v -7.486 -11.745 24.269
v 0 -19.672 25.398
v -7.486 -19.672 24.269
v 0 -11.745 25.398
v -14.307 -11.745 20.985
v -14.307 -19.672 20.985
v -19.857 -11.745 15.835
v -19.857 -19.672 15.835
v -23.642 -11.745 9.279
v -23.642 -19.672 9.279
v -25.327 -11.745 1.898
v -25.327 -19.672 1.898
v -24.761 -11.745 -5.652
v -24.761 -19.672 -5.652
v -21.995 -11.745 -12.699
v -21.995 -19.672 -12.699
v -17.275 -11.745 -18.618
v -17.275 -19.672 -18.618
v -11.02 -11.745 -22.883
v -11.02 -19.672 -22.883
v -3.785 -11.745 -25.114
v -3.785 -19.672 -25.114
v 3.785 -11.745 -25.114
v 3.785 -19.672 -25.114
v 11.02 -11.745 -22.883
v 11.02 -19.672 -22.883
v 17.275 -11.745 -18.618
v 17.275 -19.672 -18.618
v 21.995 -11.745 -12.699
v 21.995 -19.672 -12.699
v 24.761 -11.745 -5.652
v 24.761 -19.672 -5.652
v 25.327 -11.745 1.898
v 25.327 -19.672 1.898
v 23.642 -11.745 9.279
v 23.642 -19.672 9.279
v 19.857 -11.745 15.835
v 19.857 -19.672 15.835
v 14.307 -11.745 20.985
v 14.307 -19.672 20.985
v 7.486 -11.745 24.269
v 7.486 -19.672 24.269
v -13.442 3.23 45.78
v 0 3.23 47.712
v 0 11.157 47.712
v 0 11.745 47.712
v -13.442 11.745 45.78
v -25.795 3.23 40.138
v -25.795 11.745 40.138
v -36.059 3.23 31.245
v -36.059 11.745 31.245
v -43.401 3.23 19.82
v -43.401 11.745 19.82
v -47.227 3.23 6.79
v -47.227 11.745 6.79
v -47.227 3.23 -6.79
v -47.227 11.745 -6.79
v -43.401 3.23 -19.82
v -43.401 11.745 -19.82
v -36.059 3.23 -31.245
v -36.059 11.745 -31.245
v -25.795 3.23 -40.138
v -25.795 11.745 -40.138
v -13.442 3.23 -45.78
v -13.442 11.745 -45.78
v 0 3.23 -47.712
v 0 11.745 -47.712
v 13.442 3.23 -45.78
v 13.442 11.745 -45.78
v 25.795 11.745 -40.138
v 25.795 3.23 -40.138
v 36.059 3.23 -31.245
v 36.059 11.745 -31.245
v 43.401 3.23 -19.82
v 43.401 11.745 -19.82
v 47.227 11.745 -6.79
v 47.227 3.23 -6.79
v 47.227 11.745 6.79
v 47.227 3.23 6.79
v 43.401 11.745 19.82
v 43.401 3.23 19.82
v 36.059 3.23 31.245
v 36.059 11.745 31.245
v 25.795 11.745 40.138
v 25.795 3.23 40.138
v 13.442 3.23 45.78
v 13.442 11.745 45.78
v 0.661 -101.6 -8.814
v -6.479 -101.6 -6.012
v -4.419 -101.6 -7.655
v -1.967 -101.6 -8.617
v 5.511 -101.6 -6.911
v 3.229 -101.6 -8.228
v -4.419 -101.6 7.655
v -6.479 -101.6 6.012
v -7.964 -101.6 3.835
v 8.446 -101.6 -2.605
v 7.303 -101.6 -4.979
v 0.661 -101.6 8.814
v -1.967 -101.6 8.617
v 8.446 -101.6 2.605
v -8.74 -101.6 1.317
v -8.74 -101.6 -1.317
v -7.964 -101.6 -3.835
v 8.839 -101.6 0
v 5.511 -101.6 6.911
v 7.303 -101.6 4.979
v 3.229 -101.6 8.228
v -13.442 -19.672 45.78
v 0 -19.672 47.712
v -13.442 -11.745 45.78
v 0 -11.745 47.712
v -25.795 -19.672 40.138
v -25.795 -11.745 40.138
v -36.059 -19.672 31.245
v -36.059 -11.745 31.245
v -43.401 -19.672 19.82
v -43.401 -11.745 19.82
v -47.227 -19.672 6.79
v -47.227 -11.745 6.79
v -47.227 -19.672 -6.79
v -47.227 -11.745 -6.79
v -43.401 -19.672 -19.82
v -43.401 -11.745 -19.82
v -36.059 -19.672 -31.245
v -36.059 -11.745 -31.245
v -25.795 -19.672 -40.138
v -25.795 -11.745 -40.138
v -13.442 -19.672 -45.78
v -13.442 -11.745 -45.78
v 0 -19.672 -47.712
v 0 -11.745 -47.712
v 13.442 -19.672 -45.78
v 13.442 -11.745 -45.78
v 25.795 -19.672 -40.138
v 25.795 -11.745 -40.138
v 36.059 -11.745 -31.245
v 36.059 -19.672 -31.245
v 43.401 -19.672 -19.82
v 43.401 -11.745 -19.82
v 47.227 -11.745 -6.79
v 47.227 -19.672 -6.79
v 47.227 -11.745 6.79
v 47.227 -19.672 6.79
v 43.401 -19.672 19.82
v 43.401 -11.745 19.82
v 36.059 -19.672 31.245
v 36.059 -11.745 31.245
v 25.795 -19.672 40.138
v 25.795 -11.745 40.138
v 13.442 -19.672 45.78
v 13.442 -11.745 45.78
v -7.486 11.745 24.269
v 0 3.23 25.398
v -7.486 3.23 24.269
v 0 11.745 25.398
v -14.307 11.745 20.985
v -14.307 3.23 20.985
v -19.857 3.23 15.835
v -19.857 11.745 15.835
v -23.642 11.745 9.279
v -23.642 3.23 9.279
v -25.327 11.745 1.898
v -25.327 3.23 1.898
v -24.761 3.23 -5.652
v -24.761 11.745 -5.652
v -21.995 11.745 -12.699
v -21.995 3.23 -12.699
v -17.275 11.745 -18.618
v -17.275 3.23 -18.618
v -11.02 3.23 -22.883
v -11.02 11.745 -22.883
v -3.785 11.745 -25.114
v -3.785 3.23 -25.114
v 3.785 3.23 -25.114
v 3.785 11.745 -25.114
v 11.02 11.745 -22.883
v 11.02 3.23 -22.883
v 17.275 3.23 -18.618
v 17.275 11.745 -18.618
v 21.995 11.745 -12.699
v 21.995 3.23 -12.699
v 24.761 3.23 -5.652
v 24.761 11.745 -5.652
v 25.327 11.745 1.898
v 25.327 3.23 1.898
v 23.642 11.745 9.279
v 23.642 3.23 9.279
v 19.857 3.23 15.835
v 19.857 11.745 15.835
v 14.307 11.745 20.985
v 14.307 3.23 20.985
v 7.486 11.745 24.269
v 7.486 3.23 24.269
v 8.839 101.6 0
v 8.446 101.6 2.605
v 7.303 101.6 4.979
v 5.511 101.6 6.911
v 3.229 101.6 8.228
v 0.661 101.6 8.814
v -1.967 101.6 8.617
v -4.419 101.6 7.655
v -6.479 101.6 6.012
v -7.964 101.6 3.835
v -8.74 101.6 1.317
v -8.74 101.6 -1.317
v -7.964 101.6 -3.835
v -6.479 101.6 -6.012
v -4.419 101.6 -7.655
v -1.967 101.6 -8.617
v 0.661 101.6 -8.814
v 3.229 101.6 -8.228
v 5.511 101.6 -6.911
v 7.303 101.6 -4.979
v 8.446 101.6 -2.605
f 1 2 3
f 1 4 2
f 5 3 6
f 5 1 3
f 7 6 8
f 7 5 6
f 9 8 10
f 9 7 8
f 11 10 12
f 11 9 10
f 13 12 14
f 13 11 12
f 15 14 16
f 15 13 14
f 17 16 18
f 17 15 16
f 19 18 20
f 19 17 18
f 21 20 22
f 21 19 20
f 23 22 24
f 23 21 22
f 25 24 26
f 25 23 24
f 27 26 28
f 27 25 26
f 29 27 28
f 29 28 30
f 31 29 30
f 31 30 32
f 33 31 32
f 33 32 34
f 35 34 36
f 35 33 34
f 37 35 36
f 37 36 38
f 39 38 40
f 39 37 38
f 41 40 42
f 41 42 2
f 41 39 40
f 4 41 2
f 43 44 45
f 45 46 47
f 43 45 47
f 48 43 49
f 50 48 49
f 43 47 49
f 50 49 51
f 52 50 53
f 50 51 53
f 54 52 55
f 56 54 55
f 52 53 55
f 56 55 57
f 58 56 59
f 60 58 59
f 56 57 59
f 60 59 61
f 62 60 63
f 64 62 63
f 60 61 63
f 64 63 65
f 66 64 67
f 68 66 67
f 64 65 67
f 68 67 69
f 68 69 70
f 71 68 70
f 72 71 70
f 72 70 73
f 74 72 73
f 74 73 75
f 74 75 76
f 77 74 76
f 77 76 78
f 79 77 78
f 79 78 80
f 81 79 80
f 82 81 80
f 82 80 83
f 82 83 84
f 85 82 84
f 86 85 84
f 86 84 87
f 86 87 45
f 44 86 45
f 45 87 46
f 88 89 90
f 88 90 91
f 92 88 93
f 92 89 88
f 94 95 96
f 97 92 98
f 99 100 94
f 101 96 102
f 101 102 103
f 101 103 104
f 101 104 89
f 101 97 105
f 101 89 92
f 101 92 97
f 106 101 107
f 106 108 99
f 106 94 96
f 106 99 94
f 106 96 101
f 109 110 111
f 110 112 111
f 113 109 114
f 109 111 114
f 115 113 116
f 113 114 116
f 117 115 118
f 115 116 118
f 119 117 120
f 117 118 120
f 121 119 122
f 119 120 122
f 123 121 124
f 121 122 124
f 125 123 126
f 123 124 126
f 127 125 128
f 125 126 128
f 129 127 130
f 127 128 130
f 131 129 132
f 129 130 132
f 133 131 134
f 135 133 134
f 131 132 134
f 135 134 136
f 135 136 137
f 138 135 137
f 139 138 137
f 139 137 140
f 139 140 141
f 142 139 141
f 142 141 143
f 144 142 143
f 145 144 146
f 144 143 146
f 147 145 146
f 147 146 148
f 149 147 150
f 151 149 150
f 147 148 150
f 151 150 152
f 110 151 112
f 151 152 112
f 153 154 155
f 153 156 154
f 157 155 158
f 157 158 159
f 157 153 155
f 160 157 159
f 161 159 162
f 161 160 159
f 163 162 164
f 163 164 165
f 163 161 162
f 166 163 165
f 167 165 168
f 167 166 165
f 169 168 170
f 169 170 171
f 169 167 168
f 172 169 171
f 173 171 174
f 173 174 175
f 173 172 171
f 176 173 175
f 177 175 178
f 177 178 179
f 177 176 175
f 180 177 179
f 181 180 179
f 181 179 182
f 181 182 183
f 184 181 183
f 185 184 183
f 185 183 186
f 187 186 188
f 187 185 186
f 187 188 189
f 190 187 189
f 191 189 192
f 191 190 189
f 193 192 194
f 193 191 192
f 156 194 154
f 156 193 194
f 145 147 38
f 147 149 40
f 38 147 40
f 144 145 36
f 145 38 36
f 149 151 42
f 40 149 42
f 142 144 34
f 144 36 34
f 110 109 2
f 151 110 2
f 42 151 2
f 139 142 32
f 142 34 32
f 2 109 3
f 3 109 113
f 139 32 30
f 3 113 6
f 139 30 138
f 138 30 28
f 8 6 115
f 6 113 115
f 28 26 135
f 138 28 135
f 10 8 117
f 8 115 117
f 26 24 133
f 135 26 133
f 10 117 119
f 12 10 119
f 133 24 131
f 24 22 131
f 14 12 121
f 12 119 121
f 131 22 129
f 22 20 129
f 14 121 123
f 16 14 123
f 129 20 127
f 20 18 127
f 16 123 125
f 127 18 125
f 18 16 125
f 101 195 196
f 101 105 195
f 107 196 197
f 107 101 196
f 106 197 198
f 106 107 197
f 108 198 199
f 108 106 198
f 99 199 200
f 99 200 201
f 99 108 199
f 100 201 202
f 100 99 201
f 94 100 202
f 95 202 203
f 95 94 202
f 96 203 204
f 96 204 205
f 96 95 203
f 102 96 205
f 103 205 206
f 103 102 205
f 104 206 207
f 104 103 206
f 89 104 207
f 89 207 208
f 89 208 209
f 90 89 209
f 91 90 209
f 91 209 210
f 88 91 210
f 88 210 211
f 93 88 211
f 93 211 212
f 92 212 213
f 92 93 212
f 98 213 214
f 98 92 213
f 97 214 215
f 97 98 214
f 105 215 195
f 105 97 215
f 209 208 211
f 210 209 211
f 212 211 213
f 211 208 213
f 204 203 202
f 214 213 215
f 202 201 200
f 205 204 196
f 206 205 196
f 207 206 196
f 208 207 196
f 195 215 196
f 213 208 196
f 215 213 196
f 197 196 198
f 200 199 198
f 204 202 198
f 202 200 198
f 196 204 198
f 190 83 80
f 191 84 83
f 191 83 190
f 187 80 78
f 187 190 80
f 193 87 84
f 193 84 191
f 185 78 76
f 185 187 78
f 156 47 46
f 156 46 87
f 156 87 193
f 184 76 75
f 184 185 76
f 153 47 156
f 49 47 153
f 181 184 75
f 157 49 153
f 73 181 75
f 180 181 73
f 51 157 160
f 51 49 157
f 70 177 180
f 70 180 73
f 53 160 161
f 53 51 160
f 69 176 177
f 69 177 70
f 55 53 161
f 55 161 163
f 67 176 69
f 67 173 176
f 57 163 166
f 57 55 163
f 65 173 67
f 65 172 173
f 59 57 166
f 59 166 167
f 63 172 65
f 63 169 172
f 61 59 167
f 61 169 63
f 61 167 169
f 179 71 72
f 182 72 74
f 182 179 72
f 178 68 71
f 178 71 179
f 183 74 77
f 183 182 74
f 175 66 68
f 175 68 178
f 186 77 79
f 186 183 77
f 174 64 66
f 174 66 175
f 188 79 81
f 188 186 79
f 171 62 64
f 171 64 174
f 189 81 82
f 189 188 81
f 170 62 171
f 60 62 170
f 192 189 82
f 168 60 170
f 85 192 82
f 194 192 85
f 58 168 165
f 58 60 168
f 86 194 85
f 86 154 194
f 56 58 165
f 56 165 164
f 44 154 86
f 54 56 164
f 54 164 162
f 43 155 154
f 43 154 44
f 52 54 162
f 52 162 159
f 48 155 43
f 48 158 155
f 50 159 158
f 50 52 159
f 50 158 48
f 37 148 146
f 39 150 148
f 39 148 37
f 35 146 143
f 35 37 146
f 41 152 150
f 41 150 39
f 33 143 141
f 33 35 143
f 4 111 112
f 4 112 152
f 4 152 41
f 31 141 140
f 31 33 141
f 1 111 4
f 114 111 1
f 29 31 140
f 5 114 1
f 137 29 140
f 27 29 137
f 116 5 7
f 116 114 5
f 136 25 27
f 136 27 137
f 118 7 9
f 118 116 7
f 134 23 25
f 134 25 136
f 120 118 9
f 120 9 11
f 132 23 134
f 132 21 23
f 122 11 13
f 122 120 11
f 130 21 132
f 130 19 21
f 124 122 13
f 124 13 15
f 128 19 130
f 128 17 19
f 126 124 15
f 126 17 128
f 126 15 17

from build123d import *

# Parameters (mm, degrees)
F0_R     = 8.8389730631
F1_DEPTH = 101.6
F2_W     = 0.5872286856
F2_H     = 4.4042207301
F2_W_2   = 7.9275965691
F2_H_2   = 22.3147161305


with BuildPart() as f1:
    # F0 (on Front) → F1 (new body, symmetric)
    with BuildSketch(Plane.XZ):
        Circle(F0_R)
    extrude(amount=F1_DEPTH, both=True)


with BuildPart() as f3:
    # F2 (on Right) → F3 (revolve)
    with BuildSketch(Plane.YZ):
        with Locations((11.4509724081, 45.5102752894)):
            Rectangle(F2_W, F2_H)
        Polygon((3.229761729, 25.397669524), (11.7445867509, 25.397669524), (11.7445867509, 43.3081649244), (11.1573580652, 43.3081649244), (11.1573580652, 47.7123856544), (3.229761729, 47.7123856544), align=None)
    revolve(axis=Axis((0, 0, 0), (0, -1, 0)))


with BuildPart() as f3b:
    # F2 (on Right) → F3, piece 2 (revolve)
    with BuildSketch(Plane.YZ):
        with Locations((-15.7083850354, 36.5550275892)):
            Rectangle(F2_W_2, F2_H_2)
    revolve(axis=Axis((0, 0, 0), (0, -1, 0)))


solid = Compound([f1.part, f3.part, f3b.part])
